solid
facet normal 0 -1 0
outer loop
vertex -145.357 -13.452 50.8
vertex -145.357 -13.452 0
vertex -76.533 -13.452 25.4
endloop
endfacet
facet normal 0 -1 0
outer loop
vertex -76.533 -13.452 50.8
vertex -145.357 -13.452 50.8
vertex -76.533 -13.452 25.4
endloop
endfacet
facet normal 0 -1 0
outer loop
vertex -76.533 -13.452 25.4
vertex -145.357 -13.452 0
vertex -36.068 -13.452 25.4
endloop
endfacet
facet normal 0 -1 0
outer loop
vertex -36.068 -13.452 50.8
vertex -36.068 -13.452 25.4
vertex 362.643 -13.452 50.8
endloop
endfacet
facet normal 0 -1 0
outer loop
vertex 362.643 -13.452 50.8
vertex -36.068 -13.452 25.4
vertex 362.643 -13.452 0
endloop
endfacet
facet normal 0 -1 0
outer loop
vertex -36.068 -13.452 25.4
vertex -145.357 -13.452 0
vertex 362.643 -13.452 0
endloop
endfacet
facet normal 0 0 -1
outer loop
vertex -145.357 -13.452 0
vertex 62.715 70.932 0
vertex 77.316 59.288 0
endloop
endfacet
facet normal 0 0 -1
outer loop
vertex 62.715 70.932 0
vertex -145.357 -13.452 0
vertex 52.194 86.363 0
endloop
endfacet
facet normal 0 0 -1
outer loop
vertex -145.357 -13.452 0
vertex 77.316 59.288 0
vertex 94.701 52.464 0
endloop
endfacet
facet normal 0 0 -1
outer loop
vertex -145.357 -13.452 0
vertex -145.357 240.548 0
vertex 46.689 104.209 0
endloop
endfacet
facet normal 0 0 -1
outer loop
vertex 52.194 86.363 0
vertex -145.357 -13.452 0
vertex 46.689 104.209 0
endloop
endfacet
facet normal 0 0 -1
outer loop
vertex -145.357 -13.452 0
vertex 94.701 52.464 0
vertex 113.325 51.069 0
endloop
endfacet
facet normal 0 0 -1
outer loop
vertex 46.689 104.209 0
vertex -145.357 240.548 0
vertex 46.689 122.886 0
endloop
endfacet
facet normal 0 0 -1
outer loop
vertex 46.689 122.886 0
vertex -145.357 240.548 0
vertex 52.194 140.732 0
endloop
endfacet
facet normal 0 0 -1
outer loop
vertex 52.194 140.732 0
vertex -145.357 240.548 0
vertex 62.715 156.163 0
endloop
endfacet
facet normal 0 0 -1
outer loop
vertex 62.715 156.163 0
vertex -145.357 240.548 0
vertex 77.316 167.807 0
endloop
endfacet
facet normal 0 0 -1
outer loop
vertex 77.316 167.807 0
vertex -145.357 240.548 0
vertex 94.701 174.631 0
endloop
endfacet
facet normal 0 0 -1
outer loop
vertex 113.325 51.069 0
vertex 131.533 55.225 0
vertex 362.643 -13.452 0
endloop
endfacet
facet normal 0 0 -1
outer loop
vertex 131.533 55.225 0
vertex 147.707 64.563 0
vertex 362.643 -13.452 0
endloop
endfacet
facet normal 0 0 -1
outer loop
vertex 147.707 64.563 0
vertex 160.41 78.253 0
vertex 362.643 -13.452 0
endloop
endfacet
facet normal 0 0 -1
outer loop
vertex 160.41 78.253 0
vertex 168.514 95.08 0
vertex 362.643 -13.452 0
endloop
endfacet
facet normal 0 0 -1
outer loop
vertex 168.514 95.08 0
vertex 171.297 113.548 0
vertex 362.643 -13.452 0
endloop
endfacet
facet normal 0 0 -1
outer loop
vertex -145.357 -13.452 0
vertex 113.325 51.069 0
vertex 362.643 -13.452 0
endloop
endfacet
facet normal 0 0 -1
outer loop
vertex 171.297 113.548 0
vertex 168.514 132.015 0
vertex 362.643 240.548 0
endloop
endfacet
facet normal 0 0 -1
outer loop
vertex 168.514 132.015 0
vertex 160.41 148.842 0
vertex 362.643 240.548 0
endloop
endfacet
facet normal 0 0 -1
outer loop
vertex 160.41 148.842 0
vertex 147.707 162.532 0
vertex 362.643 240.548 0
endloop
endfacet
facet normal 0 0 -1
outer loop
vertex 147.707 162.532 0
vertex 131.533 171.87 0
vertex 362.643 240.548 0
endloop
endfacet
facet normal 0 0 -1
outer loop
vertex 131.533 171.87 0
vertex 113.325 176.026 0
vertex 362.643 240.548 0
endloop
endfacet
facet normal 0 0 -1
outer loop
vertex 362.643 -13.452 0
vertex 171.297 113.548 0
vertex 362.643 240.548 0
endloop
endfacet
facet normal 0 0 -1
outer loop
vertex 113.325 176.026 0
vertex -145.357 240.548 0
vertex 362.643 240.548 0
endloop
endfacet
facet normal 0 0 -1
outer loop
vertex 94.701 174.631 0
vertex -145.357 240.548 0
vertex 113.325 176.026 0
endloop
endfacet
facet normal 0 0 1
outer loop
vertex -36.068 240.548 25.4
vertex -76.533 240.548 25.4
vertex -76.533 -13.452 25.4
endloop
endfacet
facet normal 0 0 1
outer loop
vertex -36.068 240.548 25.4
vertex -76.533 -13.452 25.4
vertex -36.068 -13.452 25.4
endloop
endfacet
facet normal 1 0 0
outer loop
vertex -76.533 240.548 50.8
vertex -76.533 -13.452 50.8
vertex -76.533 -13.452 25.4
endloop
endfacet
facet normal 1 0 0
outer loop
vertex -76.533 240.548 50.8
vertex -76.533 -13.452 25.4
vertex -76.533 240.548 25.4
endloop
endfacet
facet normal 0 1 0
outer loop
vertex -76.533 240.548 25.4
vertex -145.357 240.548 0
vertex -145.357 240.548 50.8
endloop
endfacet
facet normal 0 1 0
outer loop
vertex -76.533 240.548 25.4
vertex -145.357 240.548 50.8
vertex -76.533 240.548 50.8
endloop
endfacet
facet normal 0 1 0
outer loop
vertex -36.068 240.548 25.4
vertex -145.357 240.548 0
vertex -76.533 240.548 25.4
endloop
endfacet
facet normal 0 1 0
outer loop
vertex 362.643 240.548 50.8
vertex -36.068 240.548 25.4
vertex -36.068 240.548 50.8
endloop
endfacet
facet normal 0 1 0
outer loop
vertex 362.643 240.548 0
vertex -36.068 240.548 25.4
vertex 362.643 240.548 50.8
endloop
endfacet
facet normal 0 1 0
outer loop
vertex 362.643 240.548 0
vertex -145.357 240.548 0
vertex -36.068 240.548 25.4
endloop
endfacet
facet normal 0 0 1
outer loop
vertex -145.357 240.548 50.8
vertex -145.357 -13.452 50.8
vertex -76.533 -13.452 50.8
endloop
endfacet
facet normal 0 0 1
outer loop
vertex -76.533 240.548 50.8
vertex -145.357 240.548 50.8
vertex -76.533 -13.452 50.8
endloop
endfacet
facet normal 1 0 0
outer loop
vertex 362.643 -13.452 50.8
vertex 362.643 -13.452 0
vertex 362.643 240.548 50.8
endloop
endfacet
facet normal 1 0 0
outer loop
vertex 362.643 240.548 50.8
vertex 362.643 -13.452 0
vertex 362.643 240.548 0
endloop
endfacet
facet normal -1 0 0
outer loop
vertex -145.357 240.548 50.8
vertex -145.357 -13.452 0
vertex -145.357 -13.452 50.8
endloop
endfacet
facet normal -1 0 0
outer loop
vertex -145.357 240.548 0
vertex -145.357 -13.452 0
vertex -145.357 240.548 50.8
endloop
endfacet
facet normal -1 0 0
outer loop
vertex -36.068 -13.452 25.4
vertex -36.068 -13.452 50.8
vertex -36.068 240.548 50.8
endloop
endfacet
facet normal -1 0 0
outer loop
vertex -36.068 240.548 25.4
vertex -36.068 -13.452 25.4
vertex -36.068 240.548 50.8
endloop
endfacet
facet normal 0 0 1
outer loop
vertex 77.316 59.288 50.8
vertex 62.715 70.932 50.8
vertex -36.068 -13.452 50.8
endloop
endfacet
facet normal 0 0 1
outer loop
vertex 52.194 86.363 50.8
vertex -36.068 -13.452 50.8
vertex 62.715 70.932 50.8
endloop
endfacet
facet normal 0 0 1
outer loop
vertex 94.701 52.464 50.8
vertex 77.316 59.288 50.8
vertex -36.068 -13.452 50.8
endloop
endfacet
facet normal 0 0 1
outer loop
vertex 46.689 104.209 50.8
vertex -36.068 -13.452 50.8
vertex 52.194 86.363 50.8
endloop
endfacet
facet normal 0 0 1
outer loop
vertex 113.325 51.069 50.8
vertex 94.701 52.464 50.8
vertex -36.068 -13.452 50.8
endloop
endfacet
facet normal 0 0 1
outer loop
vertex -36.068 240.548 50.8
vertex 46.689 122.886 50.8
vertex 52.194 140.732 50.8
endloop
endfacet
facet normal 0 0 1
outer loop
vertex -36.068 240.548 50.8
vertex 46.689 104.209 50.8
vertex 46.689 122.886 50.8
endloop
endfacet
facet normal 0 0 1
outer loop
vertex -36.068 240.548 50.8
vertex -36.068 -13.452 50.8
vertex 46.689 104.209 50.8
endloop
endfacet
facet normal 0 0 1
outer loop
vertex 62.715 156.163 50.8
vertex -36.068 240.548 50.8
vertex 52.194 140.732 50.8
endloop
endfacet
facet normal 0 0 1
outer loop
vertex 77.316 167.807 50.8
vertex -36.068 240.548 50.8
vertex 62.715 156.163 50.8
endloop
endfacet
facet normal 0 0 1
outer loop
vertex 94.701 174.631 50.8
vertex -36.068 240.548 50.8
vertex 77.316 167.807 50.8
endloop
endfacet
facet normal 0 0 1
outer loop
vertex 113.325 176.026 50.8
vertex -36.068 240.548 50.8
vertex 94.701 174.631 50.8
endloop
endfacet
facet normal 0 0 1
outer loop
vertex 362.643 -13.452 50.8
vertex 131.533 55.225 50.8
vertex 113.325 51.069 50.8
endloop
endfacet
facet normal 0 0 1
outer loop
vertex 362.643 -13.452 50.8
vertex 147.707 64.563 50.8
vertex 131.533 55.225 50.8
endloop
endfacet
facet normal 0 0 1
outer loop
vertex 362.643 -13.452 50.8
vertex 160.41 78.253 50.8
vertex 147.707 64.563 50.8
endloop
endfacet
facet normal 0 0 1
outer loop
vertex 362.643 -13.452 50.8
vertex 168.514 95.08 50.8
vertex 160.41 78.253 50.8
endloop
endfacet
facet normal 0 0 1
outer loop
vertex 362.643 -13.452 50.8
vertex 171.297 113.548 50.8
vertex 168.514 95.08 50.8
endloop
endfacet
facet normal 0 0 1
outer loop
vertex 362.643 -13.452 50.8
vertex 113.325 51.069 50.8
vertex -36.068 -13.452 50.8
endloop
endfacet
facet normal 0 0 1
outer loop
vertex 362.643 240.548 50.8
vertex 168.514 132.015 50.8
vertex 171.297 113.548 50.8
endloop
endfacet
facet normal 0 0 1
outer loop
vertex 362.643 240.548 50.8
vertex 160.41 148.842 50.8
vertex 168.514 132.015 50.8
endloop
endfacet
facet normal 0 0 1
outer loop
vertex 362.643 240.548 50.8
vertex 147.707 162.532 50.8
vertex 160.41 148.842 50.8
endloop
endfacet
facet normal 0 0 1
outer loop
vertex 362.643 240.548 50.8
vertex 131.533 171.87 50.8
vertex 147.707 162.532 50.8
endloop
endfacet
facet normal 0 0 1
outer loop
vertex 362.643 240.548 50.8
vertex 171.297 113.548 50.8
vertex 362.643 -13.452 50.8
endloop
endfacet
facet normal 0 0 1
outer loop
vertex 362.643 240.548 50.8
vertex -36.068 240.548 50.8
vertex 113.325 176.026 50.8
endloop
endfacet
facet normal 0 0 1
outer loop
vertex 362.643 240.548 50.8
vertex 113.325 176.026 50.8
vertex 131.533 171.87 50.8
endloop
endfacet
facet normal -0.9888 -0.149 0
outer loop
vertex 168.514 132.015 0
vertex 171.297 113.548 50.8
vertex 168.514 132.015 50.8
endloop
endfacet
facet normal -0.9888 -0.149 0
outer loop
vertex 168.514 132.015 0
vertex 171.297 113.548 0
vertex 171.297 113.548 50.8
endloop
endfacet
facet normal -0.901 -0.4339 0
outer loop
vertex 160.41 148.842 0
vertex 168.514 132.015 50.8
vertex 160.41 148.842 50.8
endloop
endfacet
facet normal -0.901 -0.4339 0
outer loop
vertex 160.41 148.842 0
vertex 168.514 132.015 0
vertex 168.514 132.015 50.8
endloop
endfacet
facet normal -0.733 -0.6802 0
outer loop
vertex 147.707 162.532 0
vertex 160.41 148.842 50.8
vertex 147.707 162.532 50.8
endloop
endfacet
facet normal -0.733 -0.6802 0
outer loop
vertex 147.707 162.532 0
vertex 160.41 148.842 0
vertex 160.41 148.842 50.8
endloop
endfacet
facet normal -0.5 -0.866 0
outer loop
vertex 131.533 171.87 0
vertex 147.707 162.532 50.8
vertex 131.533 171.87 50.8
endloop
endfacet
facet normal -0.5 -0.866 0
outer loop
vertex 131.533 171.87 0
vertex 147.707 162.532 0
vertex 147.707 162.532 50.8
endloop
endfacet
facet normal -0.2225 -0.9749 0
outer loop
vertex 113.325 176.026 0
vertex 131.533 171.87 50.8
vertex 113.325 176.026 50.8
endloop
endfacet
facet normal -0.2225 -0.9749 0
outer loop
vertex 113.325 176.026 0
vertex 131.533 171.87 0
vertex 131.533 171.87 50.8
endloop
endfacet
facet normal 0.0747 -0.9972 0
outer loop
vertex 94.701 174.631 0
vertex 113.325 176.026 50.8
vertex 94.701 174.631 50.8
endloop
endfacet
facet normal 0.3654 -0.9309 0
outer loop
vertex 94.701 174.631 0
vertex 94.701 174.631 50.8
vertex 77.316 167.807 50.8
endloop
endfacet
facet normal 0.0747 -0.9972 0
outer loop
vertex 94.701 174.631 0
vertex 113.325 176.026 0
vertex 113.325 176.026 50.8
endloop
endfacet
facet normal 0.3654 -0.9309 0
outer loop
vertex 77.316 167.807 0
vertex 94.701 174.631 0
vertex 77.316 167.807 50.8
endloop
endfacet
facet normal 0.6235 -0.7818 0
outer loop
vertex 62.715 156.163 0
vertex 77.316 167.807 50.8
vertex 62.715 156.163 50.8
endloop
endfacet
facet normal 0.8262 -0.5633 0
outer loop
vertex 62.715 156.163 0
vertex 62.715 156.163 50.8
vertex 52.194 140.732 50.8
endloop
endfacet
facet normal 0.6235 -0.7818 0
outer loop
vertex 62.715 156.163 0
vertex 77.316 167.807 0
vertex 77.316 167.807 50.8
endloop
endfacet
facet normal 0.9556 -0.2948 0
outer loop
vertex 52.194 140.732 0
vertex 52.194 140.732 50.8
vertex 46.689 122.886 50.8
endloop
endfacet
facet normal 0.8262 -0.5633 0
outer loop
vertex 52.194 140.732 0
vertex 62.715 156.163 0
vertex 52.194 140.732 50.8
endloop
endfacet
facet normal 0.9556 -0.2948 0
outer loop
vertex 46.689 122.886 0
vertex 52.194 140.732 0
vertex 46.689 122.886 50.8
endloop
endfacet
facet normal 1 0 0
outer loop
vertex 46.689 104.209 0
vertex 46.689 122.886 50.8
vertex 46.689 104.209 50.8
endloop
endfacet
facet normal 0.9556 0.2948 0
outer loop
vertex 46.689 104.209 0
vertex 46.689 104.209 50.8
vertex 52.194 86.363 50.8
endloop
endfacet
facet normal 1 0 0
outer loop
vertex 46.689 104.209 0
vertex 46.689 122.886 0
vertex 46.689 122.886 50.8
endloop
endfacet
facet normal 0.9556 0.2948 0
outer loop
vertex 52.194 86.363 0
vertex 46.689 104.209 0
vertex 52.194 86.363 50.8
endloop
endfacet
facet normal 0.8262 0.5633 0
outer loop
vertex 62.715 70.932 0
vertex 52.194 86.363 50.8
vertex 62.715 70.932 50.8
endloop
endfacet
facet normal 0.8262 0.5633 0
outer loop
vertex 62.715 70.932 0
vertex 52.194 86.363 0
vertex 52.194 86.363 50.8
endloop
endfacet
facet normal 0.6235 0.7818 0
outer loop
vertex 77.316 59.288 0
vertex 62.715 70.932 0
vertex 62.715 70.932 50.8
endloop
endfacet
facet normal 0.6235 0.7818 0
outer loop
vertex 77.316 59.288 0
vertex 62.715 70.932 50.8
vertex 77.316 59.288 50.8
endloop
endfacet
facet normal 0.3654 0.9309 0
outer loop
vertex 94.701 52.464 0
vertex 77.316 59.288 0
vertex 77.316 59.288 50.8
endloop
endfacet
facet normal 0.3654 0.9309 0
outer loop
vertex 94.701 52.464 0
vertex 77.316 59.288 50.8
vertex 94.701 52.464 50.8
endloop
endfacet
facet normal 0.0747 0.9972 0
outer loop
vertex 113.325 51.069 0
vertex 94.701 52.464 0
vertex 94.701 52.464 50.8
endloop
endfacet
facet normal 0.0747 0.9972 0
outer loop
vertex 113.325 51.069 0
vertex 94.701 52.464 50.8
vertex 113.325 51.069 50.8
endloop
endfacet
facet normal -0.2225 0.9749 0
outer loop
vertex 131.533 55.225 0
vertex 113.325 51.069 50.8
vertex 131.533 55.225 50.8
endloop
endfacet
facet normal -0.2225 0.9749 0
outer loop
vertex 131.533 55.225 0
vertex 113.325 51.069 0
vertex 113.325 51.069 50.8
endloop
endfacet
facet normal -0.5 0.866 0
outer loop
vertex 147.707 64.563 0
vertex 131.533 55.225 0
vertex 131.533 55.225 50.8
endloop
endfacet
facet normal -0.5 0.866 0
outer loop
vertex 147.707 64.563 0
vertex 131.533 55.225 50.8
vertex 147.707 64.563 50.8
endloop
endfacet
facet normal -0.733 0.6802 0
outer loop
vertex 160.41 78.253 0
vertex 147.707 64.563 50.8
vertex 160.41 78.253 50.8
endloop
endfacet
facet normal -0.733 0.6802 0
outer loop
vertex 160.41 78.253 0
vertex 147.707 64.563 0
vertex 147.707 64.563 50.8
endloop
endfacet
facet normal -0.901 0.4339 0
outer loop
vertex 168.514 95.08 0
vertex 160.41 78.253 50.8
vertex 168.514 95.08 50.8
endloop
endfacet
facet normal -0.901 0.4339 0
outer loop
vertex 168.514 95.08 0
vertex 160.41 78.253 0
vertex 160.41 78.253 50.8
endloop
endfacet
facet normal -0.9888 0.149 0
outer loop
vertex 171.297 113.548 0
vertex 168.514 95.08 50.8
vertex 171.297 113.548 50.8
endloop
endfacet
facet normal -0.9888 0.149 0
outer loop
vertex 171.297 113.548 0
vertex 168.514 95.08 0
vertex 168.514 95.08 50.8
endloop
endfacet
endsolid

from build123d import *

# Parameters (mm, degrees)
F0_W      = 508
F0_H      = 254
F0_R      = 62.653986
F1_DEPTH  = 25.4
F1_FACE_W = 508
F1_FACE_H = 254
F1_FACE_R = 62.653986
F2_DEPTH  = 25.4
F3_W      = 40.465146
F3_H      = 254
F4_DEPTH  = 25.4


with BuildPart() as f1:
    # F0 (on Top) → F1 (new body)
    with BuildSketch(Plane.XY):
        with Locations((108.643128, 113.547525)):
            Rectangle(F0_W, F0_H)
        with Locations((108.643128, 113.547525)):
            Circle(F0_R, mode=Mode.SUBTRACT)
    extrude(amount=F1_DEPTH)

    # F1_face (on face) → F2 (join)
    with BuildSketch(Plane(origin=(108.643128, 113.547525, 25.4), x_dir=(1, 0, 0), z_dir=(0, 0, 1))):
        Rectangle(F1_FACE_W, F1_FACE_H)
        Circle(F1_FACE_R, mode=Mode.SUBTRACT)
    extrude(amount=F2_DEPTH)

    # F3 (on face) → F4 (cut)
    with BuildSketch(Plane.XY.offset(50.8)):
        with Locations((-56.300491, 113.547525)):
            Rectangle(F3_W, F3_H)
    extrude(amount=-F4_DEPTH, mode=Mode.SUBTRACT)


solid = f1.part
